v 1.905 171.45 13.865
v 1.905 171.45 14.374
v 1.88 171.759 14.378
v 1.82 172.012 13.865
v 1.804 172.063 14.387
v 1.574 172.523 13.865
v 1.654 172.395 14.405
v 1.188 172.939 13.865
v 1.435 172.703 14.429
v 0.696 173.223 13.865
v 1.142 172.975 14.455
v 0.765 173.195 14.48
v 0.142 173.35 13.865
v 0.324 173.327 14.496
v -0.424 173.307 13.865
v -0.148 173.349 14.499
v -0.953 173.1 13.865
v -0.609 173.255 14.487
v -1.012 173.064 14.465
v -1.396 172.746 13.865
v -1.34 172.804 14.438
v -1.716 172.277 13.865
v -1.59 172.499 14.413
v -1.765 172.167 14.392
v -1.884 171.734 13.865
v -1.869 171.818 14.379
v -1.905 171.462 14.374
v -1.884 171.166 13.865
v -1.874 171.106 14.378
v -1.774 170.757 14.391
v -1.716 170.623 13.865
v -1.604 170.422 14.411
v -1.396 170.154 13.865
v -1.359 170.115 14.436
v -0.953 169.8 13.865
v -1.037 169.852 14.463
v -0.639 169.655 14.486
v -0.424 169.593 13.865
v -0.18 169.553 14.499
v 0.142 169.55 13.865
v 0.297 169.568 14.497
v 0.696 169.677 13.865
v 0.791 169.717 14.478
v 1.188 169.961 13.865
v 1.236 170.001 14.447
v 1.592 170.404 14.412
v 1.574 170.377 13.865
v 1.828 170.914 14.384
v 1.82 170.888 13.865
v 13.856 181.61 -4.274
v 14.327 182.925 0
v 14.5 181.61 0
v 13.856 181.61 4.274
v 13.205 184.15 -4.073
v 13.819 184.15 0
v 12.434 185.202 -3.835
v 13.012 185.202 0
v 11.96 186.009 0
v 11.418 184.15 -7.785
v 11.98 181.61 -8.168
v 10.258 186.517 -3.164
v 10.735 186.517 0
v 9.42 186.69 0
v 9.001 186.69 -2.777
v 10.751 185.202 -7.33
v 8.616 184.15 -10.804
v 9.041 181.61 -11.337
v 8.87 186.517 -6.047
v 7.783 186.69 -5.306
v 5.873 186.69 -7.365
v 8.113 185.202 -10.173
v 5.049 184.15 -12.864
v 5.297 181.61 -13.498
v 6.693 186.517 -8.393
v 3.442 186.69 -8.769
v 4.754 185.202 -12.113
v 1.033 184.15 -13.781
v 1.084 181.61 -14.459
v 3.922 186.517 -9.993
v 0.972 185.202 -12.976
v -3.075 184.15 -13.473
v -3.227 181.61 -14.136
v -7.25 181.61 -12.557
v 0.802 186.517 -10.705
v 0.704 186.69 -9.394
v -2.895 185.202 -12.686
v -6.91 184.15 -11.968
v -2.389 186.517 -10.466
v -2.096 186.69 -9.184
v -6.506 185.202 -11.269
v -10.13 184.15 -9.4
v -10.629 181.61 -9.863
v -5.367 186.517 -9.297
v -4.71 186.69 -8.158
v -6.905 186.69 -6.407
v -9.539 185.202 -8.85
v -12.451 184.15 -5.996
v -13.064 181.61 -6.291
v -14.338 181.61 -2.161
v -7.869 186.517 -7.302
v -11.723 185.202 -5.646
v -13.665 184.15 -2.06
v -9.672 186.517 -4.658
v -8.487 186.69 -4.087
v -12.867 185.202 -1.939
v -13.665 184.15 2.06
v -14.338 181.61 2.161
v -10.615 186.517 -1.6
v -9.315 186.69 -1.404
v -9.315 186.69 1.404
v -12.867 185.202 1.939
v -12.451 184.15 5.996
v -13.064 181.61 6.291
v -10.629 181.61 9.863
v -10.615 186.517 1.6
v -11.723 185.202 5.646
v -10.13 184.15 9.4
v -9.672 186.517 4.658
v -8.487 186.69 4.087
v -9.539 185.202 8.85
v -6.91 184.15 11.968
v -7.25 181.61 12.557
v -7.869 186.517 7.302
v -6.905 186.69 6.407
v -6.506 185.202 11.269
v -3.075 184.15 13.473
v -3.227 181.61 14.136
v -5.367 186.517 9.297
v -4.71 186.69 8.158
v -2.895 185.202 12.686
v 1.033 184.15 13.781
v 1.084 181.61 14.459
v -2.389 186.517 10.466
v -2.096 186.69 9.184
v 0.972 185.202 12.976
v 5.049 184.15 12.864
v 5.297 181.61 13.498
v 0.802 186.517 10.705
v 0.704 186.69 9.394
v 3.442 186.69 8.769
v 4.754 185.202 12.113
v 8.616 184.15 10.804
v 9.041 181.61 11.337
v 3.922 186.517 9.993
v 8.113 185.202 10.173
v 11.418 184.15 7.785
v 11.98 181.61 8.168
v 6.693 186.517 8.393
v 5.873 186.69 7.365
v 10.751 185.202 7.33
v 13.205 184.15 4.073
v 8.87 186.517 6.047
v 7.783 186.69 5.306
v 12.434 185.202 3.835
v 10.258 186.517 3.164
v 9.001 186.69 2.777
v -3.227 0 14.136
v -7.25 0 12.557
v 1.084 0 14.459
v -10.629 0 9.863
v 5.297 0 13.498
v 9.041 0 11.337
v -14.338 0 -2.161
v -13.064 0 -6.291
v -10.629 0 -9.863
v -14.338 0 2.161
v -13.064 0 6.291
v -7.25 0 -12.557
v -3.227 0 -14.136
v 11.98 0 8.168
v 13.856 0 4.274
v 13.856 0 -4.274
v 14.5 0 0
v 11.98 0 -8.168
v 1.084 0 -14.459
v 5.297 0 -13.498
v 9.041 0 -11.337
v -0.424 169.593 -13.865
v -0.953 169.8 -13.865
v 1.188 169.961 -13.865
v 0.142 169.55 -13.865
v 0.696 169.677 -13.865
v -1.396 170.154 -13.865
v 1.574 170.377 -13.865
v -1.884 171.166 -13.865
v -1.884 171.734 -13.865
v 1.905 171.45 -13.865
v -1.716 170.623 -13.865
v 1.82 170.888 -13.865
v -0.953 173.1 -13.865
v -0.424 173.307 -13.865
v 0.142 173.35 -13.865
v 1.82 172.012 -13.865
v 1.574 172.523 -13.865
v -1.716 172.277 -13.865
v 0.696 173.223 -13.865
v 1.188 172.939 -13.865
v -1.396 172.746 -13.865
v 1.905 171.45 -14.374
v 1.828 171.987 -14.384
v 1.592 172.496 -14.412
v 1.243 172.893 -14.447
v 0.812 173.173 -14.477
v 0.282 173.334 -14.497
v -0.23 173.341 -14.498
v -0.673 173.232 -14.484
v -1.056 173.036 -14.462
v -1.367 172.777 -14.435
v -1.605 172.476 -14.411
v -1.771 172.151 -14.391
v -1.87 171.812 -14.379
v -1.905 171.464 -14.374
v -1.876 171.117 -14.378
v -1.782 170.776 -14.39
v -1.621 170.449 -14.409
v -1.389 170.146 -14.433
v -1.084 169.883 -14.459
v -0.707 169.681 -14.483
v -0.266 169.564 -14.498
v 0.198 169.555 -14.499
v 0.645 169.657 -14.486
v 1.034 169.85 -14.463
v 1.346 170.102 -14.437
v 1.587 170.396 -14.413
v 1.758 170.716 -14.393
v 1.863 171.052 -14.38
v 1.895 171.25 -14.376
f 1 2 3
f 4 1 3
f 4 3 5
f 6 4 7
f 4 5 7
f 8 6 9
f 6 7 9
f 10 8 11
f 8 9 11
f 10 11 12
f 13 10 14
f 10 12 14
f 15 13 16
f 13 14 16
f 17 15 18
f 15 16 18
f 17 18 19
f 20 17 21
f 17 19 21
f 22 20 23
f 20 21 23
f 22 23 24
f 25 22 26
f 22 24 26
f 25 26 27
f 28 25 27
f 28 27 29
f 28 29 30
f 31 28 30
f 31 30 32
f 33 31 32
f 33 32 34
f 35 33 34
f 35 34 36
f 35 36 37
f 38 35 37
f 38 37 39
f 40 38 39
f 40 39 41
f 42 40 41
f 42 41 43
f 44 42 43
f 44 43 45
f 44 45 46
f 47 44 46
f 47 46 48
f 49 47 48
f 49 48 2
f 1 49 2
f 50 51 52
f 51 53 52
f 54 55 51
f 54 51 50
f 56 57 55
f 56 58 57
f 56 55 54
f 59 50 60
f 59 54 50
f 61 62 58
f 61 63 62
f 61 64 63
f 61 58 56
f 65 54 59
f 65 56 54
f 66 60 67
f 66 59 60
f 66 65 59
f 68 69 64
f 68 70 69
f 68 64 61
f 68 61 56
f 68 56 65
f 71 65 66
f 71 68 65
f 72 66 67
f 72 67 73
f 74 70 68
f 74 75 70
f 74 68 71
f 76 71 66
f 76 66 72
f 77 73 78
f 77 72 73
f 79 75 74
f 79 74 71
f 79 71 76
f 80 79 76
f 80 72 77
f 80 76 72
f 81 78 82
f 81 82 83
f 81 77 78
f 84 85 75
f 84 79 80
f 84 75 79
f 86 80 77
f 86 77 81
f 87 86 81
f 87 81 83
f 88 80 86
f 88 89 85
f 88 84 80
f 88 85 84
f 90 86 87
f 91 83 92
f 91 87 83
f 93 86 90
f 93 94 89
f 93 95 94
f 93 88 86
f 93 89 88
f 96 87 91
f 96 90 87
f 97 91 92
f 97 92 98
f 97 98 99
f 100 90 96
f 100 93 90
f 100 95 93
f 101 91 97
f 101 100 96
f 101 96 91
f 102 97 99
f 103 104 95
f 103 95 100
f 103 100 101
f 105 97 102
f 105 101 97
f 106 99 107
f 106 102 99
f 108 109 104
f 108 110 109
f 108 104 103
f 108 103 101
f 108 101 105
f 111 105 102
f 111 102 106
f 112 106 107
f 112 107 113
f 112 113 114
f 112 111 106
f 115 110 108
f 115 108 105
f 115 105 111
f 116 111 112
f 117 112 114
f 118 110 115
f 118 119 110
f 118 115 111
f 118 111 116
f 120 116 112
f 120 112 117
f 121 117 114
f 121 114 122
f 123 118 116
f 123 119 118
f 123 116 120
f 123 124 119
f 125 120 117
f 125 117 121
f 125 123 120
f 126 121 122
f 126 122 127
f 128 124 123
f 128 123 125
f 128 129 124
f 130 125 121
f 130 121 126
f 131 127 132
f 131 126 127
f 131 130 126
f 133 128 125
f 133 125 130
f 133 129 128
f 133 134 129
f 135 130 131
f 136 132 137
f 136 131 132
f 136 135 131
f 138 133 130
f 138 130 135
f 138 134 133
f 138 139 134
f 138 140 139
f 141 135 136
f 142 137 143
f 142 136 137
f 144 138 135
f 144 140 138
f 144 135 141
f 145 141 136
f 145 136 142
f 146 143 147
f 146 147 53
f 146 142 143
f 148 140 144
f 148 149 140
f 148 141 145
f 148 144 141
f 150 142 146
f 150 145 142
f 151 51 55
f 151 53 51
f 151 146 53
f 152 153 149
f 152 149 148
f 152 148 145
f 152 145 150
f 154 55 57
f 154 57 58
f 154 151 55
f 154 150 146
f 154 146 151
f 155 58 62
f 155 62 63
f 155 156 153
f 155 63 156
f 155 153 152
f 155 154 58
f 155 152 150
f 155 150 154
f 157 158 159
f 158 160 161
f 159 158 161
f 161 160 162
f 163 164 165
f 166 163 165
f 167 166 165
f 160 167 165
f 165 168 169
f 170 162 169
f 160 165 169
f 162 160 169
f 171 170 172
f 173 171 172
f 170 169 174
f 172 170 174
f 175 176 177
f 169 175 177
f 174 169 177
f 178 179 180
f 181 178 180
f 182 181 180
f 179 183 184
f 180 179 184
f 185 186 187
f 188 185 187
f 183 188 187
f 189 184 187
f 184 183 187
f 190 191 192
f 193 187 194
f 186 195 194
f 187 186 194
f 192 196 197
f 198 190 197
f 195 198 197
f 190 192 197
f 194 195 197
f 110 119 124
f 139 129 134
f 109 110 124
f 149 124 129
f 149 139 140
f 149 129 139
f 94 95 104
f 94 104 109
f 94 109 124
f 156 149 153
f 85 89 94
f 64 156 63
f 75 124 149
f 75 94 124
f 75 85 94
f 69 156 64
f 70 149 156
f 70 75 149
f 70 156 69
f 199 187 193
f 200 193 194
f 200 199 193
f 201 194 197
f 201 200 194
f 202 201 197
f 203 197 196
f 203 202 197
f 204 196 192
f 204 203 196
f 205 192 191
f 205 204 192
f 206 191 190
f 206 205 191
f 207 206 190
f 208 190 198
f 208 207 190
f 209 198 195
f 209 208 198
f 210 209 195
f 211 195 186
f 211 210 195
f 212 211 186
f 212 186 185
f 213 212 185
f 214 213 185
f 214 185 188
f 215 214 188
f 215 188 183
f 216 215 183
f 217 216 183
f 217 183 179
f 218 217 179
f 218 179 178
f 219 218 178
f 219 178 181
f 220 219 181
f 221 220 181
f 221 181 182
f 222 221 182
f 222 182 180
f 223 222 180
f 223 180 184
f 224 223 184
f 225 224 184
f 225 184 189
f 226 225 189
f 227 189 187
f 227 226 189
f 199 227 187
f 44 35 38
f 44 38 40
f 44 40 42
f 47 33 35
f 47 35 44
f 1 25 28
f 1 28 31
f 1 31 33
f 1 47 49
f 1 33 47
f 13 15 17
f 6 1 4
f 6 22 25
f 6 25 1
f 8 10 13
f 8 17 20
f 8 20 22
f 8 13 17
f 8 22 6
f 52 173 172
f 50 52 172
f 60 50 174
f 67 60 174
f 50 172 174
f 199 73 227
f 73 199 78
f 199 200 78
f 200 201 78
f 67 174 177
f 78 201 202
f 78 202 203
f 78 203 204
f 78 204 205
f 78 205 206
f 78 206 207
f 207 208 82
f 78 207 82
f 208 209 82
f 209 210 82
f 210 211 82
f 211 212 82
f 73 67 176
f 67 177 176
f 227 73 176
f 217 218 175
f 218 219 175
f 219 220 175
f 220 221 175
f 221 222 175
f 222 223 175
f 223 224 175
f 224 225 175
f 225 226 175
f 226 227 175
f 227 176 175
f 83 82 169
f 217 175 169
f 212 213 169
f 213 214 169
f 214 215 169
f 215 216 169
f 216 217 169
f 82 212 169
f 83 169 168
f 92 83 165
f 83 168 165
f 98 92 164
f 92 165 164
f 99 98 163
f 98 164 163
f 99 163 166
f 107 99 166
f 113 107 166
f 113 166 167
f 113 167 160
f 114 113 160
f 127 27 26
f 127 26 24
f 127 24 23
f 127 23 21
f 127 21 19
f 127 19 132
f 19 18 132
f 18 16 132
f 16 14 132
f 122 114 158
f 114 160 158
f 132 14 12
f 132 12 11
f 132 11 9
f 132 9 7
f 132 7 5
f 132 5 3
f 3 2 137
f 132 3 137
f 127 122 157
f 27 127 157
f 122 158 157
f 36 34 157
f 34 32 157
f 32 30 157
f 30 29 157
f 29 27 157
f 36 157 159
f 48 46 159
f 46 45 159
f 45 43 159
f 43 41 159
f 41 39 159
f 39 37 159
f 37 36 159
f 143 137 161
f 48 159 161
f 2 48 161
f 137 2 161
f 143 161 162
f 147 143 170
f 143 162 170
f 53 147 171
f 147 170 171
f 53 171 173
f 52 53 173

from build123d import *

# Parameters (mm, degrees)
SKETCH1_R           = 14.5
BOSS_EXTRUDE1_DEPTH = 186.69
FILLET1_R           = 5.08
SKETCH5_R           = 1.905
CUT_EXTRUDE4_DEPTH  = 0.635
SKETCH2_R           = 1.905
CUT_EXTRUDE5_DEPTH  = 0.635


with BuildPart() as part:
    # Sketch1 → Boss-Extrude1 (new body)
    with BuildSketch(Plane(origin=(0, 0, 0), x_dir=(1, 0, 0), z_dir=(0, 1, 0))):
        Circle(SKETCH1_R)
    extrude(amount=BOSS_EXTRUDE1_DEPTH)

    # Fillet1
    fillet1_edges = [part.edges().sort_by_distance(p)[0] for p in [
        (-14.5, 186.69, 0),
    ]]
    fillet(fillet1_edges, radius=FILLET1_R)

    # Sketch5 → Cut-Extrude4 (cut)
    with BuildSketch(Plane.XY.offset(-14.499999956)):
        with Locations((0, 171.45)):
            Circle(SKETCH5_R)
    extrude(amount=CUT_EXTRUDE4_DEPTH, mode=Mode.SUBTRACT)

    # Sketch2 → Cut-Extrude5 (cut)
    with BuildSketch(Plane.XY.offset(14.499999956)):
        with Locations((0, 171.45)):
            Circle(SKETCH2_R)
    extrude(amount=-CUT_EXTRUDE5_DEPTH, mode=Mode.SUBTRACT)


solid = part.part
